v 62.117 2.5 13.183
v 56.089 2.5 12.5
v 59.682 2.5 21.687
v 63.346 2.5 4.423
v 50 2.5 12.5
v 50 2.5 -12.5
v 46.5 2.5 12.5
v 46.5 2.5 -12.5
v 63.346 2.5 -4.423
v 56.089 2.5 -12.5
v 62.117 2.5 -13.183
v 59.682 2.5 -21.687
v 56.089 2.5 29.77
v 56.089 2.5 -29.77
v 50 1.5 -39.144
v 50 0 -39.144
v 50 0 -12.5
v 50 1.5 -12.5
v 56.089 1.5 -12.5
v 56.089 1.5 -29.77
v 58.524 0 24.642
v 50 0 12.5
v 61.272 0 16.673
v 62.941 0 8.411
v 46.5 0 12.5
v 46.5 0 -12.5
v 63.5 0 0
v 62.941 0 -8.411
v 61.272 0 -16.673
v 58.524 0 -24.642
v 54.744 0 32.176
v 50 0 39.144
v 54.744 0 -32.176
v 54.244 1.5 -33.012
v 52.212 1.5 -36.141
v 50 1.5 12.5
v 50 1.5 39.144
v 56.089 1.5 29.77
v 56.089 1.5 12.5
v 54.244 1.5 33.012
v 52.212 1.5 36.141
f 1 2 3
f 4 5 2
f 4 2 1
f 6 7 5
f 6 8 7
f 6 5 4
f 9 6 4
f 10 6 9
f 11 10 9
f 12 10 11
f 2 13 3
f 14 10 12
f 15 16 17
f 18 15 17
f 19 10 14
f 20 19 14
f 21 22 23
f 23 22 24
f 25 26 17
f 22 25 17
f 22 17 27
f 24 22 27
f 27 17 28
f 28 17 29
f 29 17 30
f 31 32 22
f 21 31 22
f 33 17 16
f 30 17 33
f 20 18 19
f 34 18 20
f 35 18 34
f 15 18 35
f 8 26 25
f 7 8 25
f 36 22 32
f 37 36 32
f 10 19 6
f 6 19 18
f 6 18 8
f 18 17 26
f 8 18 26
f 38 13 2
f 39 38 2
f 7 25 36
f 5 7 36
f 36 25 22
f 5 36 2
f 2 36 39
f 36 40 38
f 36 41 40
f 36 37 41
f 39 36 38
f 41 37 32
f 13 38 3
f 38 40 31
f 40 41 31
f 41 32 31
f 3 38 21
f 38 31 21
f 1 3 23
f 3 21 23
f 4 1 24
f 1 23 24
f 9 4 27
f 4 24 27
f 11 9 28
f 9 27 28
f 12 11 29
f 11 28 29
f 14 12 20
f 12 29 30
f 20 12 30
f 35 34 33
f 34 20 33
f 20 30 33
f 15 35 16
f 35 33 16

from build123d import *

# Parameters (mm, degrees)
BOSS_EXTRUDE1_DEPTH = 2.5
SKETCH2_W           = 6.089
SKETCH2_H           = 29.817230859
CUT_EXTRUDE1_DEPTH  = 1


with BuildPart() as part:
    # Sketch1 → Boss-Extrude1 (new body)
    with BuildSketch(Plane(origin=(0, 0, 0), x_dir=(1, 0, 0), z_dir=(0, 1, 0))):
        with BuildLine():
            Line((50, -12.5), (50, -39.143965052))
            ThreePointArc((50, -39.143965052), (63.5, 0), (50, 39.143965052))
            Line((50, 39.143965052), (50, 12.5))
            Line((50, 12.5), (46.5, 12.5))
            Line((46.5, 12.5), (46.5, -12.5))
            Line((46.5, -12.5), (50, -12.5))
        make_face()
    extrude(amount=BOSS_EXTRUDE1_DEPTH)

    # Sketch2 → Cut-Extrude1 (cut)
    with BuildSketch(Plane(origin=(0, 2.5, 0), x_dir=(1, 0, 0), z_dir=(0, 1, 0))):
        with Locations((53.0445, 27.40861543)):
            Rectangle(SKETCH2_W, SKETCH2_H)
        with Locations((53.0445, -27.40861543)):
            Rectangle(SKETCH2_W, SKETCH2_H)
    extrude(amount=-CUT_EXTRUDE1_DEPTH, mode=Mode.SUBTRACT)


solid = part.part
